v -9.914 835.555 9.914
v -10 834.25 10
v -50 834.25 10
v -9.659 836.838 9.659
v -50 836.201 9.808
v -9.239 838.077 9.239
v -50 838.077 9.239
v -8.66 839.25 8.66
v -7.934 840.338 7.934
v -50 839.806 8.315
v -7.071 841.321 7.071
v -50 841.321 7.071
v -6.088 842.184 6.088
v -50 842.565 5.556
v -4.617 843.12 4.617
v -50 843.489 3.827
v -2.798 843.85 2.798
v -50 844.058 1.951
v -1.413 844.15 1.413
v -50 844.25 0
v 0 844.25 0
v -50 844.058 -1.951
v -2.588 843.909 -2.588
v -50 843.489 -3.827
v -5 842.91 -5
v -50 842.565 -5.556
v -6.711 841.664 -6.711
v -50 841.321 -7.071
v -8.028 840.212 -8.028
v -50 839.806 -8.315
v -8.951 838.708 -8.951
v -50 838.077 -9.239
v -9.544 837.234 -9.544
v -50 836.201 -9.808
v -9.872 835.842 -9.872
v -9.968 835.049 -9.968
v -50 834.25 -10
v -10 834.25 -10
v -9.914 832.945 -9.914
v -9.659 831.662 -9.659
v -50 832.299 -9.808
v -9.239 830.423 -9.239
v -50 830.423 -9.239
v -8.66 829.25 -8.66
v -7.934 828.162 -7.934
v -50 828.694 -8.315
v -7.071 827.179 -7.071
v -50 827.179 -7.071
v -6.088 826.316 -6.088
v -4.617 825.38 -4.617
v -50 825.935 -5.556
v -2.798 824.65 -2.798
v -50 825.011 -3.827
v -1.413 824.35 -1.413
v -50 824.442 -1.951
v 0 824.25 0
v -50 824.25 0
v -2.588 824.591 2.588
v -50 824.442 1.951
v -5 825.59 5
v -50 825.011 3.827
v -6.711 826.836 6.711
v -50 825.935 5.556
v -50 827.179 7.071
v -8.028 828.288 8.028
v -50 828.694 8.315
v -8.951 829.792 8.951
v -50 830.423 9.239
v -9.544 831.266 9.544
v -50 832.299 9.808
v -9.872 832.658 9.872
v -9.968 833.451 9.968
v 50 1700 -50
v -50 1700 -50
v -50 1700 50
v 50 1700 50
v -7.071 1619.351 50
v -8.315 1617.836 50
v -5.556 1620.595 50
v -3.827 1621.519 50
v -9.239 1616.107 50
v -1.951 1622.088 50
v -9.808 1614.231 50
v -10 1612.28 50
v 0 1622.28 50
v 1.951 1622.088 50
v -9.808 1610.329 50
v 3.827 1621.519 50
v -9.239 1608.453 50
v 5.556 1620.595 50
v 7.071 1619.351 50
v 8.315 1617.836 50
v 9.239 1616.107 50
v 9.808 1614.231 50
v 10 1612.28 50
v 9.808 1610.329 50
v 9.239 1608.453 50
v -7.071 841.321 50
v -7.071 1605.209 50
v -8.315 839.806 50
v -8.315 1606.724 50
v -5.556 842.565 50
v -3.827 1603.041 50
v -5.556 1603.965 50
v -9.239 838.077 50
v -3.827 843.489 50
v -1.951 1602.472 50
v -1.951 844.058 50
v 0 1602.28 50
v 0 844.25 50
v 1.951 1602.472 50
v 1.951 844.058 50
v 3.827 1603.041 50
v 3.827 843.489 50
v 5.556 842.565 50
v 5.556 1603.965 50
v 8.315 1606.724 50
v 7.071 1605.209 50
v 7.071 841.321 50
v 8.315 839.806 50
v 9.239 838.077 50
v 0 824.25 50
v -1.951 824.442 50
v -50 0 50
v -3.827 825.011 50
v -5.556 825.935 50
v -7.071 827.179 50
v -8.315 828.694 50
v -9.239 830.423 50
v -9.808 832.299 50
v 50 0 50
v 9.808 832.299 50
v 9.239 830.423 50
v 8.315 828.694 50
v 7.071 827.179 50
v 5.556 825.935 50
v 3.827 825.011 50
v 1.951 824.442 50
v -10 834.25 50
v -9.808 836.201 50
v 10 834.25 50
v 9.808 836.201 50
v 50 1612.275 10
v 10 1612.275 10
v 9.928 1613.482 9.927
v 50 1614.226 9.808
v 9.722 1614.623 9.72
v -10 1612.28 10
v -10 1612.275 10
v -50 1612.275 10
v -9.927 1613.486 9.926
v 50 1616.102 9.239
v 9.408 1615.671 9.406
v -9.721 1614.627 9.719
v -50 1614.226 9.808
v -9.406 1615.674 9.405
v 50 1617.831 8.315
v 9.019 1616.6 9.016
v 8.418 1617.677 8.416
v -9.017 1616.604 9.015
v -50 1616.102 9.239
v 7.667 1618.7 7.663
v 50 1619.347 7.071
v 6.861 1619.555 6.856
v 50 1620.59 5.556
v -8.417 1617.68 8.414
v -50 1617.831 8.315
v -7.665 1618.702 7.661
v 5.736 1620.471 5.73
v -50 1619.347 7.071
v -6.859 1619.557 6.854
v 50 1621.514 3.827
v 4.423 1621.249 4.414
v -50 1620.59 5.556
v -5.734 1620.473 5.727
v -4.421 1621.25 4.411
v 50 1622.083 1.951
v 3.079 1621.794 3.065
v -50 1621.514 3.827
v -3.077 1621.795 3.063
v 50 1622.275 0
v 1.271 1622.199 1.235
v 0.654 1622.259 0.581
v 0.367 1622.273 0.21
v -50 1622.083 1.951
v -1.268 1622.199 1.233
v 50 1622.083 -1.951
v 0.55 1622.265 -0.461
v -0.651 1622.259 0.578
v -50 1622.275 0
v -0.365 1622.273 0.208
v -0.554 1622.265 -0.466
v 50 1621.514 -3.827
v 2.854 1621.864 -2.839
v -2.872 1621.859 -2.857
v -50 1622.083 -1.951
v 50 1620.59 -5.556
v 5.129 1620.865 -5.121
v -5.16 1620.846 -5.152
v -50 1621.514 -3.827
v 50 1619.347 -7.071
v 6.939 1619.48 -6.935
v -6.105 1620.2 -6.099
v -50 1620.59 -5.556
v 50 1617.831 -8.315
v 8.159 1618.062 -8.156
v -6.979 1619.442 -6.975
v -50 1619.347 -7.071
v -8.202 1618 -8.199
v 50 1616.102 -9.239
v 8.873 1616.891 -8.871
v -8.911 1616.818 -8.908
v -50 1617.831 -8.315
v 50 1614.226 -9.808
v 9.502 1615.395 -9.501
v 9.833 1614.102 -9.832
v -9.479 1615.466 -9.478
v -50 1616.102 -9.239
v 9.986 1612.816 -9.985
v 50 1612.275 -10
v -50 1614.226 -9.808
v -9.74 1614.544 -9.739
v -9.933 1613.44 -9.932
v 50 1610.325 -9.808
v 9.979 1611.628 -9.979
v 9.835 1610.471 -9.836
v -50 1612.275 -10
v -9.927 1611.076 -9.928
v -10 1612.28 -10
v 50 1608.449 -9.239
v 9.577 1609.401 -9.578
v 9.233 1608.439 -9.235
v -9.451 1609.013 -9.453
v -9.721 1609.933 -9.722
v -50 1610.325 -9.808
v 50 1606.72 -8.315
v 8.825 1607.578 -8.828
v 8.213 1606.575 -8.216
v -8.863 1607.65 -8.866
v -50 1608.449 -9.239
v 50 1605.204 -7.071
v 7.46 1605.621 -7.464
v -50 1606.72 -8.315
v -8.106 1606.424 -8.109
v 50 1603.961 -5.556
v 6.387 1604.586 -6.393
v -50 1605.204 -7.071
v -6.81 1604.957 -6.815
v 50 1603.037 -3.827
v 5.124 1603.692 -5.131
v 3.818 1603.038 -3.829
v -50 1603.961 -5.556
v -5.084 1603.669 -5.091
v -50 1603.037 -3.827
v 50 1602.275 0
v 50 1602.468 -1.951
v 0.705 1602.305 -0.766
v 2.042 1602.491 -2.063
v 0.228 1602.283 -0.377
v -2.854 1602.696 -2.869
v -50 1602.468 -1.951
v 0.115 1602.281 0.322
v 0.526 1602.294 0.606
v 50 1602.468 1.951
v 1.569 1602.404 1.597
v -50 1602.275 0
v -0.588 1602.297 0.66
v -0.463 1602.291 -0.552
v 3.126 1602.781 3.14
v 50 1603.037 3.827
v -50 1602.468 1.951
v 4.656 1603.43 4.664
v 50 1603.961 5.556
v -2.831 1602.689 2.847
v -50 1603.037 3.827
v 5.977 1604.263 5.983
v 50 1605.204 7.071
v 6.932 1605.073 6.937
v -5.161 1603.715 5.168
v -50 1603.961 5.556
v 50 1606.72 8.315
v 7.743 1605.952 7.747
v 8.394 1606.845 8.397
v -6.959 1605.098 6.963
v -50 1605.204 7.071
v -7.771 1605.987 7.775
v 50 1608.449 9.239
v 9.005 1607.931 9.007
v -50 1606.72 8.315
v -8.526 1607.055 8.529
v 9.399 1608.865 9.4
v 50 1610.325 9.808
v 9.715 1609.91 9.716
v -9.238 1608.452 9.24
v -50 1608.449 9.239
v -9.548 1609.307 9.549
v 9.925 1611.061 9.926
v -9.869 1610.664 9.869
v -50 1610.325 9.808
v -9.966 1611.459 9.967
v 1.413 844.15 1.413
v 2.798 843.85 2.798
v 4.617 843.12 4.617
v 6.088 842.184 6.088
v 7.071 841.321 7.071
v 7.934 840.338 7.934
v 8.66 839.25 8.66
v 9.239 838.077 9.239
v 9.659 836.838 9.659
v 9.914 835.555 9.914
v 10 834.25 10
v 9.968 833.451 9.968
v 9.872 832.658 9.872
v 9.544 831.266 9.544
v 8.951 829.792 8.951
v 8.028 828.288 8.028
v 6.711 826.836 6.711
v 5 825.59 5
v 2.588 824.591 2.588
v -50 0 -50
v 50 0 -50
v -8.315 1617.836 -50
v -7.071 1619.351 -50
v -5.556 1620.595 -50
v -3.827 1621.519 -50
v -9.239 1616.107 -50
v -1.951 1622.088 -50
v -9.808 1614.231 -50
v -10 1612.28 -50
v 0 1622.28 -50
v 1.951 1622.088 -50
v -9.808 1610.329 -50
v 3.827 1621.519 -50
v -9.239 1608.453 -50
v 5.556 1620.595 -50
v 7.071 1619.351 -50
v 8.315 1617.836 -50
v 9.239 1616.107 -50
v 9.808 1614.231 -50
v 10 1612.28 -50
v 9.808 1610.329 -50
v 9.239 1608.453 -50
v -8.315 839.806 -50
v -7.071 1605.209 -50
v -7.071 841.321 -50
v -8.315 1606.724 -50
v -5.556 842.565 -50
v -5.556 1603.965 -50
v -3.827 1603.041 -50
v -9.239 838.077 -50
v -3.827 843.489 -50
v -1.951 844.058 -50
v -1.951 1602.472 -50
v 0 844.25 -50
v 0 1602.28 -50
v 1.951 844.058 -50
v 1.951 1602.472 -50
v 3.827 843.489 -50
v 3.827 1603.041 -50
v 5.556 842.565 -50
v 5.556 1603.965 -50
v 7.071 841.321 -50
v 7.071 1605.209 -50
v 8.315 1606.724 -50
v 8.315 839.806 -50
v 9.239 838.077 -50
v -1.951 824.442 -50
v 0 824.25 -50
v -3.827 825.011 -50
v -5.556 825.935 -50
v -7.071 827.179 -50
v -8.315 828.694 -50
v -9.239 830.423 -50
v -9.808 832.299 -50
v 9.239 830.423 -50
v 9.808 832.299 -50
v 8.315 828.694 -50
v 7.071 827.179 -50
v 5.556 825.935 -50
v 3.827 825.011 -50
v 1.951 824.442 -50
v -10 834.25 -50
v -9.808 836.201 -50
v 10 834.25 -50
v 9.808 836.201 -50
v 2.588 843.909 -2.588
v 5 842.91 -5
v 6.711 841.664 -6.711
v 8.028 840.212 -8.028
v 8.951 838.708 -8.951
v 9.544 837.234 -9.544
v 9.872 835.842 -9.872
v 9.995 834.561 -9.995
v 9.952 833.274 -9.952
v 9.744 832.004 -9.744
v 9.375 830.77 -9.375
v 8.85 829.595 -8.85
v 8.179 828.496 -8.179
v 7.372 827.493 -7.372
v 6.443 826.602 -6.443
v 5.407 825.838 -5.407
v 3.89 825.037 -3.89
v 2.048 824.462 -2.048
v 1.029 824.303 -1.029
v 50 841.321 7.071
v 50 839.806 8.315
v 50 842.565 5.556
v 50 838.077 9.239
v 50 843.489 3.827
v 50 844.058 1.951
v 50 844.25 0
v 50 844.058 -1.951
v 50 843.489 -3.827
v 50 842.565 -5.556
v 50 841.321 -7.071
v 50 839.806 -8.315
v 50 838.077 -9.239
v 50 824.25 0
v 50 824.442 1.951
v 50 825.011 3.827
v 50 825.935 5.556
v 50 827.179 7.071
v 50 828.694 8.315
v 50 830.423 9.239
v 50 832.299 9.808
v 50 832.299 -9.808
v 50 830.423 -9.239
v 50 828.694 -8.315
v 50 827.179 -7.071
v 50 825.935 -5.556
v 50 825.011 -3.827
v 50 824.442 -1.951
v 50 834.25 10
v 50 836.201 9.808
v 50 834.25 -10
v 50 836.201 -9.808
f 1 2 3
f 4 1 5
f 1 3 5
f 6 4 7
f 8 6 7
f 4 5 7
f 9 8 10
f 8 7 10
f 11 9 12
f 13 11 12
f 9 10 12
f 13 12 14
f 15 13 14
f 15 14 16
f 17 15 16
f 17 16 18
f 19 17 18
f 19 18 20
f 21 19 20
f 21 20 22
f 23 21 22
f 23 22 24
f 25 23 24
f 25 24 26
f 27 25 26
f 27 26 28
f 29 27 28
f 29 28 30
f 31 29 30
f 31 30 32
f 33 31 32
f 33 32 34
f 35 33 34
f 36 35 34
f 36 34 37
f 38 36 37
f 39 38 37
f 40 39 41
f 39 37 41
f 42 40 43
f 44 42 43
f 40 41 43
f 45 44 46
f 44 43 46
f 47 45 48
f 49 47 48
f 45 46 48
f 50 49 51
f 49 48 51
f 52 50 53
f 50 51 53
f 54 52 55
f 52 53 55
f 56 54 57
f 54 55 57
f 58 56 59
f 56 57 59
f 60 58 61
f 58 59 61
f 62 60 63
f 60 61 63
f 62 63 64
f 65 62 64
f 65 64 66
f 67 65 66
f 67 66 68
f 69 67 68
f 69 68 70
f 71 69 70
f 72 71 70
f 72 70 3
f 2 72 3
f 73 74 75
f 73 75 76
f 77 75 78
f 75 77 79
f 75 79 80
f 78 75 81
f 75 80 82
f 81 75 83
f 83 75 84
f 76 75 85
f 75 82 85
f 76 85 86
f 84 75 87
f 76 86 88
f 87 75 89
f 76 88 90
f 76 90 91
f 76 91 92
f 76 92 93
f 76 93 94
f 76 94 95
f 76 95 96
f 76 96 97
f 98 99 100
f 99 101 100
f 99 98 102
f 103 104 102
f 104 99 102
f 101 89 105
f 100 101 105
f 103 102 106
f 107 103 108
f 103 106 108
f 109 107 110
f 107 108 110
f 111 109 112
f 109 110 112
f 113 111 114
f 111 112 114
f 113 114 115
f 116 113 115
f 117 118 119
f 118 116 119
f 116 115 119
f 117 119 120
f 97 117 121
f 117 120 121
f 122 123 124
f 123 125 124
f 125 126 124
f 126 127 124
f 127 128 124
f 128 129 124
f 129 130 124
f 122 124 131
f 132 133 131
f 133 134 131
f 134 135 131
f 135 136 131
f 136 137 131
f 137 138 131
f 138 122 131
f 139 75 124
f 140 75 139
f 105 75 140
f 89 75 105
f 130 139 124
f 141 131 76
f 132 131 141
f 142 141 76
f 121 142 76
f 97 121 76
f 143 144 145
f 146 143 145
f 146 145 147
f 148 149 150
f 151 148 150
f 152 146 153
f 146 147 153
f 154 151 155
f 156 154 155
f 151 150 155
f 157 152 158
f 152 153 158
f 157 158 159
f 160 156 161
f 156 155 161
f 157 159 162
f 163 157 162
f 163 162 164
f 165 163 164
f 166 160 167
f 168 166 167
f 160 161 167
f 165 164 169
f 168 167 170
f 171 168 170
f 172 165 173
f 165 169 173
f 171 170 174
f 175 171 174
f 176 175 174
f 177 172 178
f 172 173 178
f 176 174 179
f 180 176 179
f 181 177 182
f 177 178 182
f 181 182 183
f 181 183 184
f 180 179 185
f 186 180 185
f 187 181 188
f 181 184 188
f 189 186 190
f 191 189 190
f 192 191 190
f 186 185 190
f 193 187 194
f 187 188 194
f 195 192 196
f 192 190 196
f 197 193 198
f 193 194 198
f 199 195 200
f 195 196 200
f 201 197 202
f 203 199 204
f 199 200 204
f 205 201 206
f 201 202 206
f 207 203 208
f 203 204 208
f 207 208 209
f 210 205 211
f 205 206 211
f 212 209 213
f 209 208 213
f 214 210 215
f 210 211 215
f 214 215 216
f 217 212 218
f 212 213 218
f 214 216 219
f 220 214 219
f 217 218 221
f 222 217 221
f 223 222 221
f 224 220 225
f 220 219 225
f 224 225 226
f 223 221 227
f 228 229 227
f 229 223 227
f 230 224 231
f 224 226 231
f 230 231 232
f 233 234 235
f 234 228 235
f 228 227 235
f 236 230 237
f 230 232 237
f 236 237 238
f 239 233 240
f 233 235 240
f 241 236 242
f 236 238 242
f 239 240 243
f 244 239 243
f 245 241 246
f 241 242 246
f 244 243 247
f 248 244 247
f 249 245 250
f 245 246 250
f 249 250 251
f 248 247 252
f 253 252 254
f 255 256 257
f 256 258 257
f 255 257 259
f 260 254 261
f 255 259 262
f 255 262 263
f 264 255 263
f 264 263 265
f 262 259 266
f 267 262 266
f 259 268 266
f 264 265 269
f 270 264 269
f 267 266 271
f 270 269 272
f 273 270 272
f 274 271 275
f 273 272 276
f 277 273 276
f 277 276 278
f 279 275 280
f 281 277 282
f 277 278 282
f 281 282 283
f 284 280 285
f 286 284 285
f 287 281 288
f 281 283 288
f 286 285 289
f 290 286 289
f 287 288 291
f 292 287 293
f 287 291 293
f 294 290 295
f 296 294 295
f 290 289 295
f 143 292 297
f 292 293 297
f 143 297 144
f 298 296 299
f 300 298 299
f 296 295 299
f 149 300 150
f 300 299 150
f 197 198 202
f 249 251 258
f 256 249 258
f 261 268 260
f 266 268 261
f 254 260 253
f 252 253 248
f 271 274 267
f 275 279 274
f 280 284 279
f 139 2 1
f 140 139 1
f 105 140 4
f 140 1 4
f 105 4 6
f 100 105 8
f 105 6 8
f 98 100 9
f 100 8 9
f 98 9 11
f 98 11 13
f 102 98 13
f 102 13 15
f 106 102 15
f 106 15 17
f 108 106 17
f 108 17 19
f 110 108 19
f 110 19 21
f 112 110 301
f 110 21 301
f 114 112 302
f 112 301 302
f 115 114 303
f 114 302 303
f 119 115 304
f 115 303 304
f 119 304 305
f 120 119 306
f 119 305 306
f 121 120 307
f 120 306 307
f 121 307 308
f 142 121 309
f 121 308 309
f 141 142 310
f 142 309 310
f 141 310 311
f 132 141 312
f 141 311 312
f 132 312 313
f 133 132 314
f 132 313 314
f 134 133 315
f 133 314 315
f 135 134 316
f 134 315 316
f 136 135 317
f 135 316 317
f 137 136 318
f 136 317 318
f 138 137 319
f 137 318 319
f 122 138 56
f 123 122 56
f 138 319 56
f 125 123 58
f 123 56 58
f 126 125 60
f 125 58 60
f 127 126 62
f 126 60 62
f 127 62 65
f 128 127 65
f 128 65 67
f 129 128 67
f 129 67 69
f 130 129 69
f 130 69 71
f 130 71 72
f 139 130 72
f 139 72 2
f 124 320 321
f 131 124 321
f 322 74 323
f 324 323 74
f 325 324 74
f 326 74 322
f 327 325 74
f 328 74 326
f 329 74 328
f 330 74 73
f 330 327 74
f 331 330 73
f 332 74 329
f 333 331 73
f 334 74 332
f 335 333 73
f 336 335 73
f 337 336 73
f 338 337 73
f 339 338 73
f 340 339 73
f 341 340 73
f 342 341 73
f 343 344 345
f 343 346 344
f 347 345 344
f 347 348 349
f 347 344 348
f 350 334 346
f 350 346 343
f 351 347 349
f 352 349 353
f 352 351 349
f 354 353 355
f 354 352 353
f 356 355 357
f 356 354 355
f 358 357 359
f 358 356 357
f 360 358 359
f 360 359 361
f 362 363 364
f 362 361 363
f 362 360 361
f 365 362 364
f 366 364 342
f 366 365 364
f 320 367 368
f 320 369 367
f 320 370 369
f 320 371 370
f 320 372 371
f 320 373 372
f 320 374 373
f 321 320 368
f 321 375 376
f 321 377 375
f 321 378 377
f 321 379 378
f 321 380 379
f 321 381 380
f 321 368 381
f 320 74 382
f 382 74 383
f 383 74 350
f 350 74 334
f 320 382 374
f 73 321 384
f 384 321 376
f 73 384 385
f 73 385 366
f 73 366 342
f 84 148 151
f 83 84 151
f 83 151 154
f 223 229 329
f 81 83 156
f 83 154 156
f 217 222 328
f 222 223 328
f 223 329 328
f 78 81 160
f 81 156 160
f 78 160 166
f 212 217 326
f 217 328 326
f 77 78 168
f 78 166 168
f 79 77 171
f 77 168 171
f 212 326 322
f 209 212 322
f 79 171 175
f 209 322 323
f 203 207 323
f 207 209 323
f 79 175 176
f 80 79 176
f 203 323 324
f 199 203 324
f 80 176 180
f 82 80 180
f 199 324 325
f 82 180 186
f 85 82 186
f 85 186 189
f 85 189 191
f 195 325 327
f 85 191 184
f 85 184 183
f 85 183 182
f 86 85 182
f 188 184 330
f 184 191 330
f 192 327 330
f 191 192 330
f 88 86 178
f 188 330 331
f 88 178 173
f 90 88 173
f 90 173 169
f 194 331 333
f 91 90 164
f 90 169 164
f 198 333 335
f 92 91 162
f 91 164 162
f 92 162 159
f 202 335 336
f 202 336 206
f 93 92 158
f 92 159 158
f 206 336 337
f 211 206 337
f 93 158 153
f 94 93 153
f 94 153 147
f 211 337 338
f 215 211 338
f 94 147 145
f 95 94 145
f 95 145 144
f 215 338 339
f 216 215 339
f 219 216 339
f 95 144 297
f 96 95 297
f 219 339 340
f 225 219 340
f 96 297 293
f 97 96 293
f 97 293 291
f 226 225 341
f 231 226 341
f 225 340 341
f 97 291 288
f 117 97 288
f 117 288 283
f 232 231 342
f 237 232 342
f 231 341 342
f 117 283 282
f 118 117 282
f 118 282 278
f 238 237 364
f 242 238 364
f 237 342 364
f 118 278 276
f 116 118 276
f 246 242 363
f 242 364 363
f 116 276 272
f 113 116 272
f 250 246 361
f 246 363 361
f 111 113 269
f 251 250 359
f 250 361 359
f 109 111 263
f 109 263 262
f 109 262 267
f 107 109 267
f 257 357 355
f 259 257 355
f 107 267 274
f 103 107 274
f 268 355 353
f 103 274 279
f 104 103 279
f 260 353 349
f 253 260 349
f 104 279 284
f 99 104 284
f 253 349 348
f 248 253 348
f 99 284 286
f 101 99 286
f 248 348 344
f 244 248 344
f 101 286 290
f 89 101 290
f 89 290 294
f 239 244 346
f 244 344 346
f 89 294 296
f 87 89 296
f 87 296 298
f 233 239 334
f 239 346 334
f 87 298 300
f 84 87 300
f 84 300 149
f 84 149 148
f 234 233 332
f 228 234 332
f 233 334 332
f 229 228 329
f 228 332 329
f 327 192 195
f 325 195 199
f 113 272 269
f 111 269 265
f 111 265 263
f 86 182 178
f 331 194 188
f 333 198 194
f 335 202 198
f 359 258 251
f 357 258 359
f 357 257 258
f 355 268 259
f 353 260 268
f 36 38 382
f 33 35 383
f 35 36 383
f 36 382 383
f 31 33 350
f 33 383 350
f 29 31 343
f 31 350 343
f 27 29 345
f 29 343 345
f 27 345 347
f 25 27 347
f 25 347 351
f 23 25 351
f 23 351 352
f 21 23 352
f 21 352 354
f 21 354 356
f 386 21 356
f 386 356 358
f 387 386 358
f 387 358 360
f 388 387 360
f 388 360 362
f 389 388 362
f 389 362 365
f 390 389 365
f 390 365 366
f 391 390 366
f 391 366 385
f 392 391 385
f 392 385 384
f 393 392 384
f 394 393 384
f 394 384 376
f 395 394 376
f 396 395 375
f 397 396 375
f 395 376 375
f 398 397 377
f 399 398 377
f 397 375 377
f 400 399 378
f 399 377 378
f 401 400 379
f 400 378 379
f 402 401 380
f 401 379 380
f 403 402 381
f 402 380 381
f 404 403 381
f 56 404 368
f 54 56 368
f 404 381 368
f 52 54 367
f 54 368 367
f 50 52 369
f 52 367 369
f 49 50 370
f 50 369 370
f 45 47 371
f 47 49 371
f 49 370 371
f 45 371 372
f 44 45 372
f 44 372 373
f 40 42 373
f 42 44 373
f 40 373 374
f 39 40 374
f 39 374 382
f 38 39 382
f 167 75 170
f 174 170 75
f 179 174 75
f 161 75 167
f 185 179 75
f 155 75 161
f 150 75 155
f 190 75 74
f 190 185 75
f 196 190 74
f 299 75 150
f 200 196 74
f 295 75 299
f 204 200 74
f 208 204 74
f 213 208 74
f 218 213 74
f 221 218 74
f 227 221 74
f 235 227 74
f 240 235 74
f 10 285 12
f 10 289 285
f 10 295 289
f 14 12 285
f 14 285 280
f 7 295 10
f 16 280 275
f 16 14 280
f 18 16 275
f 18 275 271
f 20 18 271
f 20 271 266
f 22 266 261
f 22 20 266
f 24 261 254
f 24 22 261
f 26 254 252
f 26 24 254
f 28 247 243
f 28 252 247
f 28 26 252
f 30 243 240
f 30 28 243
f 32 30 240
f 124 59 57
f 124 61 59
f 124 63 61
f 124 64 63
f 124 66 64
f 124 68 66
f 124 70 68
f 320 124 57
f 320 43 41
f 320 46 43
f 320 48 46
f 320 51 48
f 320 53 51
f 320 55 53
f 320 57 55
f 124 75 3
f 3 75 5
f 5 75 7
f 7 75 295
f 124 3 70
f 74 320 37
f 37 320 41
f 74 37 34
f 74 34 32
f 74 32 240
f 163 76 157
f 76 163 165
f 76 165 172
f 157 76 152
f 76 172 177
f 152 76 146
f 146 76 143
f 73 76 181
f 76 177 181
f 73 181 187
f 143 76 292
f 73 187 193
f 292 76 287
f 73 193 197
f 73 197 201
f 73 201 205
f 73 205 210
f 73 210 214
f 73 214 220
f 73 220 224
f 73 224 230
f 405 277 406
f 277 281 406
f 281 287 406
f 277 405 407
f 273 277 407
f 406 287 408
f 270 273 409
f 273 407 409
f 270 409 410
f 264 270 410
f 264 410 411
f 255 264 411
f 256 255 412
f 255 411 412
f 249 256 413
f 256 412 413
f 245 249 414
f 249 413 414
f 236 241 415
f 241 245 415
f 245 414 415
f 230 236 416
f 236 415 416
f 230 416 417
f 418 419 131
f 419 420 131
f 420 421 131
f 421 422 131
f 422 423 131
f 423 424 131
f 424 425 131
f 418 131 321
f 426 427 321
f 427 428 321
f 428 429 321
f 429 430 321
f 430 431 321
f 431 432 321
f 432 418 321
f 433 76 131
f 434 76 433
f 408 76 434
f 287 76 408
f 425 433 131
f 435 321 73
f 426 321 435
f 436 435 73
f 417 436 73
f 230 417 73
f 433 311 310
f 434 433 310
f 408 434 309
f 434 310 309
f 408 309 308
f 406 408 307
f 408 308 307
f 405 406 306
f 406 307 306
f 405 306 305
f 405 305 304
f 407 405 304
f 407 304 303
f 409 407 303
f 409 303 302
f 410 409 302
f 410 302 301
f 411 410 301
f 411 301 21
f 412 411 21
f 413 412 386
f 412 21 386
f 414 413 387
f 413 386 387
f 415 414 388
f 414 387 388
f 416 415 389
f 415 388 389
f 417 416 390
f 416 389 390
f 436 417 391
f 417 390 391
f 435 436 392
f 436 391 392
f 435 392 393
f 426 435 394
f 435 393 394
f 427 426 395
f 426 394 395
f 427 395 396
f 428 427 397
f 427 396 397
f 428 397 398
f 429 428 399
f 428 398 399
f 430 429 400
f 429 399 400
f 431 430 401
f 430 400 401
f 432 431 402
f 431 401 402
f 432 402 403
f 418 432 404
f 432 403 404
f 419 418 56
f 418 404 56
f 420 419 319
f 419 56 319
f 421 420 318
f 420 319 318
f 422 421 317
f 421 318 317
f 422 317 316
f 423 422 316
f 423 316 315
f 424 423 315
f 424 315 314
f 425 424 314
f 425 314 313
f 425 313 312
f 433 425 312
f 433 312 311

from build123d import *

# Parameters (mm, degrees)
ESBO_O1_W                = 100
ESBO_O1_H                = 100
RESSALTO_EXTRUS_O1_DEPTH = 1700
FUROS_GUIA_COM_20_0MM1_D = 20
FUROS_GUIA_COM_20_0MM2_D = 20


with BuildPart() as part:
    # Esboço1 → Ressalto-extrusão1 (new body)
    with BuildSketch(Plane(origin=(0, 0, 0), x_dir=(1, 0, 0), z_dir=(0, 1, 0))):
        Rectangle(ESBO_O1_W, ESBO_O1_H)
    extrude(amount=RESSALTO_EXTRUS_O1_DEPTH)

    # Furos-guia com Ø20.0mm1 (through all)
    with Locations(Plane(origin=(50, 0, 0), x_dir=(0, 0, -1), z_dir=(1, 0, 0))):
        with Locations((0, 834.25), (0, 1612.275483602)):
            Hole(FUROS_GUIA_COM_20_0MM1_D / 2)

    # Furos-guia com Ø20.0mm2 (through all)
    with Locations(Plane.XY.offset(50)):
        with Locations((0, 834.25), (0, 1612.28)):
            Hole(FUROS_GUIA_COM_20_0MM2_D / 2)


solid = part.part
